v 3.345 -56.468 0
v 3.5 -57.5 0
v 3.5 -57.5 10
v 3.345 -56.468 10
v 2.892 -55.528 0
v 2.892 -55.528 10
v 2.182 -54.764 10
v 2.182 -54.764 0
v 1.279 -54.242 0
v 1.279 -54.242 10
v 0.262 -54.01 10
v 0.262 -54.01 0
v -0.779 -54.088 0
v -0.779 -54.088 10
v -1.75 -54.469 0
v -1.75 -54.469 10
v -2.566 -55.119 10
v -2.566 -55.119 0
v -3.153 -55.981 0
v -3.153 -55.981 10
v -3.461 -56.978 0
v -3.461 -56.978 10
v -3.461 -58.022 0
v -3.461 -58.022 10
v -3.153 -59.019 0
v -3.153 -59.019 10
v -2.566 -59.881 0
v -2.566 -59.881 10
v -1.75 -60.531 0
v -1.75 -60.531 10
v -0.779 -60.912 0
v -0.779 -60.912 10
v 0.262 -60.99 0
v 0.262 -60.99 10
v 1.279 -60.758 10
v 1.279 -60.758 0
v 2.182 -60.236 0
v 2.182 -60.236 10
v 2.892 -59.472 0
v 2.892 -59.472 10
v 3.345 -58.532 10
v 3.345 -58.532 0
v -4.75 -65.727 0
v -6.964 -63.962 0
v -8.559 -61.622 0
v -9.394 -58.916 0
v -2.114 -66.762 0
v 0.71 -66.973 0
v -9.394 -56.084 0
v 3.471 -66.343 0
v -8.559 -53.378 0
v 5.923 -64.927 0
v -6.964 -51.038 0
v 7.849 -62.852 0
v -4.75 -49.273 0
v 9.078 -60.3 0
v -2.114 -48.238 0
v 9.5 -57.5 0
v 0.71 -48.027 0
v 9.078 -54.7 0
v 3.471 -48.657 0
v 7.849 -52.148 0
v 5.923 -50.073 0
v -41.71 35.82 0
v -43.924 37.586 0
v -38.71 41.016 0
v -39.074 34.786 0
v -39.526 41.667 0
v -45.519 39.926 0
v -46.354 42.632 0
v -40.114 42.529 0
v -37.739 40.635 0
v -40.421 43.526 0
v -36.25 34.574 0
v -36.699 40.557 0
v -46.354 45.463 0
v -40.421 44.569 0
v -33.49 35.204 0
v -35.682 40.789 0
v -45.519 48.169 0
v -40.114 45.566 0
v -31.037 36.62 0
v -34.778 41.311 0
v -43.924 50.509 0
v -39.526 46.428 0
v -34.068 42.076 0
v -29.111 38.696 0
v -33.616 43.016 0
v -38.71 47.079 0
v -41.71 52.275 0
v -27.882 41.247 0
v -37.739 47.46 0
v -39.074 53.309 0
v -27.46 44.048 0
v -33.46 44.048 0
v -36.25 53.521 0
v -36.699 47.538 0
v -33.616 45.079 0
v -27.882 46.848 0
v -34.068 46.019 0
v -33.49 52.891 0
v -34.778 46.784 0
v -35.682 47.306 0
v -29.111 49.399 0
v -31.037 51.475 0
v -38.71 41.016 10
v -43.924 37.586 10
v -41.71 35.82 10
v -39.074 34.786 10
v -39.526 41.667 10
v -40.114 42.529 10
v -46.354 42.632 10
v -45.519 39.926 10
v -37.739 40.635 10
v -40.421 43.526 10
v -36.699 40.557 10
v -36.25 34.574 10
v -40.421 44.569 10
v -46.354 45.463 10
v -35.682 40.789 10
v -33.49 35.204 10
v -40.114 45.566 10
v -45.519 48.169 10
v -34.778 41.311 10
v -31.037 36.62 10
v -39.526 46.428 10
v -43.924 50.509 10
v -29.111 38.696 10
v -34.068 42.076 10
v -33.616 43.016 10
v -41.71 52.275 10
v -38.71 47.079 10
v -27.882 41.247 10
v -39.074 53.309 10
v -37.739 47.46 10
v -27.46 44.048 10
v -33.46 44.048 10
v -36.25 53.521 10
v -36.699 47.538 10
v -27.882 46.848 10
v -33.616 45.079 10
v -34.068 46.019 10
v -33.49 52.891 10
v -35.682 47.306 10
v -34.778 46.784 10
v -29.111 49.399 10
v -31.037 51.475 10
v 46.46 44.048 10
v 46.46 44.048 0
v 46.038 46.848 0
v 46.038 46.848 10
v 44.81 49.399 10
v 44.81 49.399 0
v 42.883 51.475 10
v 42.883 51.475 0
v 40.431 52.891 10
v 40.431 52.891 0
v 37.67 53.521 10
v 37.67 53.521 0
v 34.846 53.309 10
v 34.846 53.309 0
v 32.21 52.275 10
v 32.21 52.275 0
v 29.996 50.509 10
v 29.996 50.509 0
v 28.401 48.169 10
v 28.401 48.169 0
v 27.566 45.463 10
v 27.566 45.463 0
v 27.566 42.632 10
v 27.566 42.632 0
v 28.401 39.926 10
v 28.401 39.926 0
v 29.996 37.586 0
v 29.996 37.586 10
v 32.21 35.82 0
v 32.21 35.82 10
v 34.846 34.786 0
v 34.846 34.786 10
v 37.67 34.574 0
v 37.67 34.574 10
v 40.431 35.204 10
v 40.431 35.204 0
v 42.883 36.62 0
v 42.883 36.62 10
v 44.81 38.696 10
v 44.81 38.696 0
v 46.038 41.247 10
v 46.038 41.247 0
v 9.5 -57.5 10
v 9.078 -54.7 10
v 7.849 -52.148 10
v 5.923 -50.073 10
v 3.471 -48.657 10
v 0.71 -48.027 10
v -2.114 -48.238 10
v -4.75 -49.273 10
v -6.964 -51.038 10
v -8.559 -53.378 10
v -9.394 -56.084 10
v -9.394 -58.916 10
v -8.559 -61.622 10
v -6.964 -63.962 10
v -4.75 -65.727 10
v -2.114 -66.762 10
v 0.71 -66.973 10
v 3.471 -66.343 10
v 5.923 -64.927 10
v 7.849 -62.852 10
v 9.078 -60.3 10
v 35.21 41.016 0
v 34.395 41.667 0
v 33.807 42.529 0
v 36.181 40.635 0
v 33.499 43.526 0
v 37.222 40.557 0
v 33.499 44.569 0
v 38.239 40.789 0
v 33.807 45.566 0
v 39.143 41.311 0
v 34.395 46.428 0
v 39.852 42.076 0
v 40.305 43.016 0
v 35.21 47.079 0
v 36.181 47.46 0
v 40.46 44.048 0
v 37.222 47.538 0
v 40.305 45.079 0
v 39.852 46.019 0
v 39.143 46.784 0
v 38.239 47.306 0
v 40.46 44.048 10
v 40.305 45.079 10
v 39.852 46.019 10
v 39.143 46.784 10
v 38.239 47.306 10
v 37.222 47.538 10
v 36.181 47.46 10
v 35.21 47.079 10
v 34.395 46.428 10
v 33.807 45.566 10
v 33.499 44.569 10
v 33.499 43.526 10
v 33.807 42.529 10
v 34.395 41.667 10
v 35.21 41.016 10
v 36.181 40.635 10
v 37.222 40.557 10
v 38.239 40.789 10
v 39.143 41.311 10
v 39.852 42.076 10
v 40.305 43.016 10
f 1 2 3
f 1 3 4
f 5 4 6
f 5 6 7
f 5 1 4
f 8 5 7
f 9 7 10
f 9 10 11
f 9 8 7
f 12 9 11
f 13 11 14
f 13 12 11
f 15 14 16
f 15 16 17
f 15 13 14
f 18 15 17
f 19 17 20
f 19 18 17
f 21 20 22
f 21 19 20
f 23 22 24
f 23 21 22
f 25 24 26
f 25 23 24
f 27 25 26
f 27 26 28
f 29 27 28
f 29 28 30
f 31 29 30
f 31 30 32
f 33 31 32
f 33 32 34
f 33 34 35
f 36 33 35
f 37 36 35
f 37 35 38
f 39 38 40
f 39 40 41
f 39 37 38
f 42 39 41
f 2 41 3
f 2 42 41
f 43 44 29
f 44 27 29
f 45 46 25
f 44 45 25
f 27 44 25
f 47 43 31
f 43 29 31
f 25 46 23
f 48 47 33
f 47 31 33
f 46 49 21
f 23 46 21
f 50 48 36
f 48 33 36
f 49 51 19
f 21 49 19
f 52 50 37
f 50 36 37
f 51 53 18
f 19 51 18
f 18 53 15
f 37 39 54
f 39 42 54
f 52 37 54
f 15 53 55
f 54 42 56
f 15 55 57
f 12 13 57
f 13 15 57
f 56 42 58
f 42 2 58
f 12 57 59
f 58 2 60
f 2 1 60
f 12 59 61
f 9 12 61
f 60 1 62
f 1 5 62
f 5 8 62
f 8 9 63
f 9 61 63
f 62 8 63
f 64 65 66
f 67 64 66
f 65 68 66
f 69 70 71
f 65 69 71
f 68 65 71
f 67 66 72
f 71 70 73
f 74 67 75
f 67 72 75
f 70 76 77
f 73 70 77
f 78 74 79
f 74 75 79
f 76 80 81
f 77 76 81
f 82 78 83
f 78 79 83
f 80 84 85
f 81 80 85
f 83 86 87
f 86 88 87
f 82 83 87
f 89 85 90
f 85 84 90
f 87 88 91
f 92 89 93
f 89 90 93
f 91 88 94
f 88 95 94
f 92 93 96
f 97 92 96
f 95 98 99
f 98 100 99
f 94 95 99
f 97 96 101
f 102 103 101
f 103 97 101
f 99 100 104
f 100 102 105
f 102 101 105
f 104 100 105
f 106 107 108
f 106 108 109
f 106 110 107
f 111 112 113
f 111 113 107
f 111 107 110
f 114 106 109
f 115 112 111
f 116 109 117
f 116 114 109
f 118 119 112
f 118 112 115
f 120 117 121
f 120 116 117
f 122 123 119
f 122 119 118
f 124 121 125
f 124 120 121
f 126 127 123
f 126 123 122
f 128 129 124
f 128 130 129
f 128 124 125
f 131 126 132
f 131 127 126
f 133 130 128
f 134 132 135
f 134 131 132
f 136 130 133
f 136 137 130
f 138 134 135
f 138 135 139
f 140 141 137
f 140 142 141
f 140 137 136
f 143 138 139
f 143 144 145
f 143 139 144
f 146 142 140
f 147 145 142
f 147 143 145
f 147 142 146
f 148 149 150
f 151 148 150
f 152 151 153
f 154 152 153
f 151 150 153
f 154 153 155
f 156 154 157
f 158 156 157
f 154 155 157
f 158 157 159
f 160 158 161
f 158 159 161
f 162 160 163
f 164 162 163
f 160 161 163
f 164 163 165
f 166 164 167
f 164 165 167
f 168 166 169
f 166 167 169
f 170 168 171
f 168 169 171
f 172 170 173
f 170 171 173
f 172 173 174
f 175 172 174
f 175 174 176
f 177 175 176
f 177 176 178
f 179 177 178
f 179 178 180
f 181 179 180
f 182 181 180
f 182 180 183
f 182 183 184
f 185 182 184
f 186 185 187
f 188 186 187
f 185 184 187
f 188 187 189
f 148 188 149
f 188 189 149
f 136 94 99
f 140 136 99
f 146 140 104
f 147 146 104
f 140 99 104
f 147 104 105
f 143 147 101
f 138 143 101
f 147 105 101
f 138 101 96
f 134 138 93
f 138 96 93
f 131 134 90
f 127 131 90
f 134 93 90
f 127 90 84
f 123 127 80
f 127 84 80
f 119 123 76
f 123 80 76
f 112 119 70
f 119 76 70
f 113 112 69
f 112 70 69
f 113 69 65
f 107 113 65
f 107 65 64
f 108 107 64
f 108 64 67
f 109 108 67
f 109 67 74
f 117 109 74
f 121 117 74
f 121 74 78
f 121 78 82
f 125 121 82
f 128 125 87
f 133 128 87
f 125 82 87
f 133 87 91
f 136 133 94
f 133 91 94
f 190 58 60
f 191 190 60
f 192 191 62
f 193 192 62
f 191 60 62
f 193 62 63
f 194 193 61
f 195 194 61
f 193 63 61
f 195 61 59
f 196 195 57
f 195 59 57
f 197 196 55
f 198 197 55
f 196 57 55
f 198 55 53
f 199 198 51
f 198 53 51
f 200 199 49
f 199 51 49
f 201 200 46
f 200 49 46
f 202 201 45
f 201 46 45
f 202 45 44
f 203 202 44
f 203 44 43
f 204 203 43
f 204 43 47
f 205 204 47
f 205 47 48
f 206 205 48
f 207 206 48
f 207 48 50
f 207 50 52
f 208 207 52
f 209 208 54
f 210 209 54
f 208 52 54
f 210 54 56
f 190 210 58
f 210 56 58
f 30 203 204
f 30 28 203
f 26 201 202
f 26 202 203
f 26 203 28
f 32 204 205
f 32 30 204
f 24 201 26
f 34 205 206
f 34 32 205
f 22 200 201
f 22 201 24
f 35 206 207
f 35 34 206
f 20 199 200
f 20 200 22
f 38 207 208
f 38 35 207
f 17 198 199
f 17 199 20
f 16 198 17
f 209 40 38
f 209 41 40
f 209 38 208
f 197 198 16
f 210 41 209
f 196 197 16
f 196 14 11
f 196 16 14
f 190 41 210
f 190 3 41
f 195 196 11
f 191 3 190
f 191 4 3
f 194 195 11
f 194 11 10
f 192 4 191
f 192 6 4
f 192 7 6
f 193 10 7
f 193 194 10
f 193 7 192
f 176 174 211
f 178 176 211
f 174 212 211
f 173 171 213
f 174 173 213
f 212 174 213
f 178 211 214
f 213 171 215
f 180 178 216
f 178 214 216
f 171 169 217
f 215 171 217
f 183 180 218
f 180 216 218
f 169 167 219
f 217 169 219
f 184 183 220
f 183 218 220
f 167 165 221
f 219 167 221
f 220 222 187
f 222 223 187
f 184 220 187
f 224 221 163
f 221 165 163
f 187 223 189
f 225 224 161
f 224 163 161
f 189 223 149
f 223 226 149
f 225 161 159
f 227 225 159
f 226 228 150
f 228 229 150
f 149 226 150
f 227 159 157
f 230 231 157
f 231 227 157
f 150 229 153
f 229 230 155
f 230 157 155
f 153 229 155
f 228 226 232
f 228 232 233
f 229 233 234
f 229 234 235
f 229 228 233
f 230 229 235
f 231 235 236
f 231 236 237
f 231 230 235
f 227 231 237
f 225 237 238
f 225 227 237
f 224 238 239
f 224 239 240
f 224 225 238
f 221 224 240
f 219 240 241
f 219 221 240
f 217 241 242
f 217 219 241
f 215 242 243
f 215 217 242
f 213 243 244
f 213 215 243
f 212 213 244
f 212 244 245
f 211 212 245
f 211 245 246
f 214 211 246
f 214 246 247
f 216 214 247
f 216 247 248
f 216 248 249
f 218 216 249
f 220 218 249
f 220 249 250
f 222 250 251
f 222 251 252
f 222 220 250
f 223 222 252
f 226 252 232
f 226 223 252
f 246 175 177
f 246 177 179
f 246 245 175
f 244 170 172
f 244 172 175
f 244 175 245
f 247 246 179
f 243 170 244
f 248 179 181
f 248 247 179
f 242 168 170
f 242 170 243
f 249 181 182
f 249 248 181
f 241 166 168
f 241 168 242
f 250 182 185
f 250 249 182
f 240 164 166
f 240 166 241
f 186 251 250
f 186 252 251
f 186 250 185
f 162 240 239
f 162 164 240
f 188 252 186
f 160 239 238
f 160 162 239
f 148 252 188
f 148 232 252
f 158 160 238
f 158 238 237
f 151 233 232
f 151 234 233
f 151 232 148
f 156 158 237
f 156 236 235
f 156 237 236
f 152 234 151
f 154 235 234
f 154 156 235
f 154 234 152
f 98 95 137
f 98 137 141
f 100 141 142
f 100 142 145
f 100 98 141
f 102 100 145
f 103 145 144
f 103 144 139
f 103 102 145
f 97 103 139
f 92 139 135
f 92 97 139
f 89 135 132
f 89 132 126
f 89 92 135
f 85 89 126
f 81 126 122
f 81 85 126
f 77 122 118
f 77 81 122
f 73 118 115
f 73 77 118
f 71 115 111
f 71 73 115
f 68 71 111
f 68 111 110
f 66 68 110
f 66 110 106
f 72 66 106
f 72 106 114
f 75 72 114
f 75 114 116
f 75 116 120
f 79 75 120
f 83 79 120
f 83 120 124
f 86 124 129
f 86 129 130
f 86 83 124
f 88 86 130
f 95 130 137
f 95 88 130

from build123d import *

# Parameters (mm, degrees)
SKETCH1_R                    = 9.5
SKETCH1_R_2                  = 3.5
FOG_LIGHT_SCREWHOLES_DEPTH   = 10
FOG_LIGHT_SCREWHOLES_2_DEPTH = 10
FOG_LIGHT_SCREWHOLES_3_DEPTH = 10


with BuildPart() as part:
    # Sketch1 → Fog light screwholes (new body)
    with BuildSketch(Plane.XY):
        with Locations((-36.960287557, 44.047555479)):
            Circle(SKETCH1_R)
        with Locations((-36.960287557, 44.047555479)):
            Circle(SKETCH1_R_2, mode=Mode.SUBTRACT)
    extrude(amount=FOG_LIGHT_SCREWHOLES_DEPTH)


with BuildPart() as body_2:
    # Sketch1 → Fog light screwholes 2 (new body)
    with BuildSketch(Plane.XY):
        with Locations((36.960287557, 44.047555479)):
            Circle(SKETCH1_R)
        with Locations((36.960287557, 44.047555479)):
            Circle(SKETCH1_R_2, mode=Mode.SUBTRACT)
    extrude(amount=FOG_LIGHT_SCREWHOLES_2_DEPTH)


with BuildPart() as body_3:
    # Sketch1 → Fog light screwholes 3 (new body)
    with BuildSketch(Plane.XY):
        with Locations((0, -57.5)):
            Circle(SKETCH1_R)
        with Locations((0, -57.5)):
            Circle(SKETCH1_R_2, mode=Mode.SUBTRACT)
    extrude(amount=FOG_LIGHT_SCREWHOLES_3_DEPTH)


solid = Compound([part.part, body_2.part, body_3.part])
